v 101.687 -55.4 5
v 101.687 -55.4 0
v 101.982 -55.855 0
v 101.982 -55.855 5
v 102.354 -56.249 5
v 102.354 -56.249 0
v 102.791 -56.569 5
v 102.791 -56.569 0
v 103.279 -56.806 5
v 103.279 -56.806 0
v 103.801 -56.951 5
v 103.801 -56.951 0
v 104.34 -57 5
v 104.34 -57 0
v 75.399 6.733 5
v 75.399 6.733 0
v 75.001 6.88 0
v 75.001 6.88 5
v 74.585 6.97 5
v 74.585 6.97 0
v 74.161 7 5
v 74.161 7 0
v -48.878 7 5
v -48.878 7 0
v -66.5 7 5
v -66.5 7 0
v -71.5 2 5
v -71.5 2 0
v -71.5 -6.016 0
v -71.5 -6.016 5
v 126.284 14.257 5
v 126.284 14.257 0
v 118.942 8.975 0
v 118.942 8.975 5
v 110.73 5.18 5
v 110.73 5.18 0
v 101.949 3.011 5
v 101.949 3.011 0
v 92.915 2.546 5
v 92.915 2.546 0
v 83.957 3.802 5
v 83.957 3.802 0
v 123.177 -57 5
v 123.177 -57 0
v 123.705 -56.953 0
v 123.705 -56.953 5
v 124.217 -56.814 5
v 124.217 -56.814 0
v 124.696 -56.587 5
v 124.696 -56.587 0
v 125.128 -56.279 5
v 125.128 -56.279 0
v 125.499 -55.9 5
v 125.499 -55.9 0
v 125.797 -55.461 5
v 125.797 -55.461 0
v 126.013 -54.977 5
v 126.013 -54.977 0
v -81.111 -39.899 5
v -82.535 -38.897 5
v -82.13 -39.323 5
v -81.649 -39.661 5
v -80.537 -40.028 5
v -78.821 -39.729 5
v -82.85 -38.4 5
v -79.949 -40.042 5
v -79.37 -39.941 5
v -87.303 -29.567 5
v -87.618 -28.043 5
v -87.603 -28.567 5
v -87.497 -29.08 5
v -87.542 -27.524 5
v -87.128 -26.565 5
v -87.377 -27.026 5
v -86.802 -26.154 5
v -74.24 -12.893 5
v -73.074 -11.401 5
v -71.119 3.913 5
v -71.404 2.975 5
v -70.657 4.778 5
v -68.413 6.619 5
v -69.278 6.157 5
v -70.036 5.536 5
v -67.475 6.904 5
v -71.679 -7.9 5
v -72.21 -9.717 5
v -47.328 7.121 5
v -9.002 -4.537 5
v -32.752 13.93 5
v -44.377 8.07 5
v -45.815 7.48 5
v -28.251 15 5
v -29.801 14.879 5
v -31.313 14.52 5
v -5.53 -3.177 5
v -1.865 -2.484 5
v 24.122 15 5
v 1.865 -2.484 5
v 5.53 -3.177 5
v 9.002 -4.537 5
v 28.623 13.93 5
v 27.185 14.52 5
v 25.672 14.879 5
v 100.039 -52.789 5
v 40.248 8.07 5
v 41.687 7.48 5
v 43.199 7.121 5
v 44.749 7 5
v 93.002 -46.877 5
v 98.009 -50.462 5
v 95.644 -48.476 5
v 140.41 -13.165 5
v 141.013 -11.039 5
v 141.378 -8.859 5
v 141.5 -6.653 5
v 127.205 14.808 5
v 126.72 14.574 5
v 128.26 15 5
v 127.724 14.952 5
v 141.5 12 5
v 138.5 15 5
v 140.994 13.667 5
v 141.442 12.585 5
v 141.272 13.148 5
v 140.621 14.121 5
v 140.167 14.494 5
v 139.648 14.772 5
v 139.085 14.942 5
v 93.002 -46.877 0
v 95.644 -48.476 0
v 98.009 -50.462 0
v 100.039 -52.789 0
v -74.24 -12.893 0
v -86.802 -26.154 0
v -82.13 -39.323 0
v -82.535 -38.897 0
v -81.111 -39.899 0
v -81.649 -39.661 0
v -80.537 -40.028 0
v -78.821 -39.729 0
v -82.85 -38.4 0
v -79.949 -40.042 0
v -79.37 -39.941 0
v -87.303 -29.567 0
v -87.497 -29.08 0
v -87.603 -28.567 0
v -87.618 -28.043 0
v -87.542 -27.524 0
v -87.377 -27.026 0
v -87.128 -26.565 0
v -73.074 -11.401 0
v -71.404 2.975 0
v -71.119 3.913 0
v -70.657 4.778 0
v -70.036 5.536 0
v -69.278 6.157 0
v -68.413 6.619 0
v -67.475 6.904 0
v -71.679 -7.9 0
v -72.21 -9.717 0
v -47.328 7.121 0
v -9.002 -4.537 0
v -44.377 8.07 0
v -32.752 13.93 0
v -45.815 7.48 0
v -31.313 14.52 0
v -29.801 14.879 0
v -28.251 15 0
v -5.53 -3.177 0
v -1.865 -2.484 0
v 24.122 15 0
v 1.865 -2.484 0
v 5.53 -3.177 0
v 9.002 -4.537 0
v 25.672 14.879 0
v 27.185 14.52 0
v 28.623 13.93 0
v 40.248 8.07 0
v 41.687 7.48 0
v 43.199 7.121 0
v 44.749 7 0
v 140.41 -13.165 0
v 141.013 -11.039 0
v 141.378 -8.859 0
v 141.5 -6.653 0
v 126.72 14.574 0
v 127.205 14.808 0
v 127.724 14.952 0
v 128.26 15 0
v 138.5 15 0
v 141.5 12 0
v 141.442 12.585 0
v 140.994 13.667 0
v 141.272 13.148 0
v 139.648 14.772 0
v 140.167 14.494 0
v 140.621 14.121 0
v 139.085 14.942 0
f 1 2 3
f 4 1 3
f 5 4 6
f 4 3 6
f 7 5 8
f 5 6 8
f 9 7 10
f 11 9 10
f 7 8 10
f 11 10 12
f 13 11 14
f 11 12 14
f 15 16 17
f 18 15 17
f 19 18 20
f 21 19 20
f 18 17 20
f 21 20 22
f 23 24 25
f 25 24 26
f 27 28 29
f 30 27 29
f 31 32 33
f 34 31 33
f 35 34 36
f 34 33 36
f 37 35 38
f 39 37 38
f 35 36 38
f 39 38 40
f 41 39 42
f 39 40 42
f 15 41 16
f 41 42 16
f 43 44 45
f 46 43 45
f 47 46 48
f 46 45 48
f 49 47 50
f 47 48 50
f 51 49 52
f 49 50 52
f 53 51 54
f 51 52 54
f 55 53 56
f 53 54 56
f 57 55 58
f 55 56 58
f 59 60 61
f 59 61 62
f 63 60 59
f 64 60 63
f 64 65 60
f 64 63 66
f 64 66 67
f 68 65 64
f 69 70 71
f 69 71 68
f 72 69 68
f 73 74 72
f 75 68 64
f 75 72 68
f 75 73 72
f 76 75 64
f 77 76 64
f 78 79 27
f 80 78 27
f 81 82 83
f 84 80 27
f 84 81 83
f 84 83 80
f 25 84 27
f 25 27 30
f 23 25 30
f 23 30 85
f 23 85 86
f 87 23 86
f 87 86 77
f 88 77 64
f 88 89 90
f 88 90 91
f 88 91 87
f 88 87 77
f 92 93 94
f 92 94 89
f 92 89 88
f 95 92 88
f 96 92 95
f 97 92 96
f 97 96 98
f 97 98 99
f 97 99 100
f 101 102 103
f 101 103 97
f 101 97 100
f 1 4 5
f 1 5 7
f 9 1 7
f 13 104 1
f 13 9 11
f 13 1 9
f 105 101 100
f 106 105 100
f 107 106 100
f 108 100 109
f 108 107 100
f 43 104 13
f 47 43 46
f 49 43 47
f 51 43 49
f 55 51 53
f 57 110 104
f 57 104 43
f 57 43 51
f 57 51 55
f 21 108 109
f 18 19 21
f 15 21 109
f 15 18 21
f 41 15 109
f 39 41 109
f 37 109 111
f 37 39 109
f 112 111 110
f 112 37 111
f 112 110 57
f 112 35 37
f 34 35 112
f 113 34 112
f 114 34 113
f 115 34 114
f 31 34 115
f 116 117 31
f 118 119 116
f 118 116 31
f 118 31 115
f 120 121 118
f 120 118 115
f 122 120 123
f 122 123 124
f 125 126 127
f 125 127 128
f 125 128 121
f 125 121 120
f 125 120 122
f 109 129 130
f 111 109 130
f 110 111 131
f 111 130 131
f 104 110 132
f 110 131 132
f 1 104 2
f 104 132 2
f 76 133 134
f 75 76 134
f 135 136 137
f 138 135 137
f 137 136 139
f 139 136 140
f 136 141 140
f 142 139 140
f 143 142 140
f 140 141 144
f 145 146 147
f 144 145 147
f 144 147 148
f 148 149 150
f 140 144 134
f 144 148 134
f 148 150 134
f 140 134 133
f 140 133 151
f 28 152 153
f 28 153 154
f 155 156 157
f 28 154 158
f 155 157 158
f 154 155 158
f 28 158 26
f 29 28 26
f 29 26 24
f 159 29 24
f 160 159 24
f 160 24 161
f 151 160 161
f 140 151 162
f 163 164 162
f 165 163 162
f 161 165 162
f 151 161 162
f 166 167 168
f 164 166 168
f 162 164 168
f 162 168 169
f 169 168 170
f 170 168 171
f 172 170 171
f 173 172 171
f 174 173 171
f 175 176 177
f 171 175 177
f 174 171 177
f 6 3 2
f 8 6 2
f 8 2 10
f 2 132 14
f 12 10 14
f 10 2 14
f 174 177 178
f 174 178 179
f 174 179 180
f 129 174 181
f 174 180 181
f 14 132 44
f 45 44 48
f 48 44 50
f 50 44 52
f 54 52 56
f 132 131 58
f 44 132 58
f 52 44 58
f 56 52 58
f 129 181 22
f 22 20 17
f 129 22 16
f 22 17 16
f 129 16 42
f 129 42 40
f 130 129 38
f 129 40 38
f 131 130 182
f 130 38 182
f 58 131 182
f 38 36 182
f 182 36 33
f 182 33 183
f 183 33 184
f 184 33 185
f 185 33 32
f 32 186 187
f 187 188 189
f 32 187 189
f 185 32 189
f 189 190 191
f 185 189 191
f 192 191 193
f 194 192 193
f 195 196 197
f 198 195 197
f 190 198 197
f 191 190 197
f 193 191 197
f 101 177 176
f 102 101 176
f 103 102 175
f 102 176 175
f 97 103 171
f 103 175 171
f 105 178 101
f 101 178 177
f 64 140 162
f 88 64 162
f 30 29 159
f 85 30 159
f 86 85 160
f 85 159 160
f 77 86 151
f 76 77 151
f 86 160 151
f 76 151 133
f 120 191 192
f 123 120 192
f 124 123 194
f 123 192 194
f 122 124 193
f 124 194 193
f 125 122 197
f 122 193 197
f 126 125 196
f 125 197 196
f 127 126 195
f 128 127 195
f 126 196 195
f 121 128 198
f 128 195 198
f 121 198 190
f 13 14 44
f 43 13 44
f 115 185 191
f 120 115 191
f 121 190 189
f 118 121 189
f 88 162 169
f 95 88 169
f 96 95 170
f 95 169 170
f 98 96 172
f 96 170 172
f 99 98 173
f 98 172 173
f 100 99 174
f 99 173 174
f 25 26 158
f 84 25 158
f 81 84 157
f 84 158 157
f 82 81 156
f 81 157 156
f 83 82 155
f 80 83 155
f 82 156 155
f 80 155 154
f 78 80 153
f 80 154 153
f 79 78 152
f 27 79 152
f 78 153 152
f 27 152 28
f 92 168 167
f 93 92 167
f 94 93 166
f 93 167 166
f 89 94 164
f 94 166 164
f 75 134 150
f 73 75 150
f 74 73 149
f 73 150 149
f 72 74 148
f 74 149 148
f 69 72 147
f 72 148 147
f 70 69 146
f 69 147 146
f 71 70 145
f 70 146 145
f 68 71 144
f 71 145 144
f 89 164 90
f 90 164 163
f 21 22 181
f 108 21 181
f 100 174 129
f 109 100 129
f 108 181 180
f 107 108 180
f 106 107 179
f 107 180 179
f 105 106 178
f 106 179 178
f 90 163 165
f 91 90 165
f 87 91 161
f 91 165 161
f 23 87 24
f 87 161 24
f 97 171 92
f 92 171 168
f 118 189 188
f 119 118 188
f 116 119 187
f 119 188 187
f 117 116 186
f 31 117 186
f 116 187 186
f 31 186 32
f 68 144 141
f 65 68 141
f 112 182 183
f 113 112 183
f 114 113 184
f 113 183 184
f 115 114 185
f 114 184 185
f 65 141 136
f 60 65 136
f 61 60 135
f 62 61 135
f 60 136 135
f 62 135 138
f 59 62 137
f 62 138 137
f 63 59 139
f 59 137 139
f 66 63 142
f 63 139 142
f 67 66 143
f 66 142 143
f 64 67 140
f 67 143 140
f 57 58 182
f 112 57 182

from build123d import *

# Parameters (mm, degrees)
EXTRUDE1_DEPTH = 5


with BuildPart() as part:
    # Sketch1 → Extrude1 (new body)
    with BuildSketch(Plane.XY):
        with BuildLine():
            Line((9.001968821, -4.537365816), (93.001968821, -46.87685134))
            ThreePointArc((93.001968821, -46.87685134), (98.008613867, -50.462021725), (101.687244374, -55.40040394))
            ThreePointArc((101.687244374, -55.40040394), (102.79133326, -56.569164438), (104.34033103, -57))
            Line((104.34033103, -57), (123.176722972, -57))
            ThreePointArc((123.176722972, -57), (124.918831839, -56.442346555), (126.013278698, -54.976704463))
            Line((126.013278698, -54.976704463), (140.410371512, -13.164510908))
            ThreePointArc((140.410371512, -13.164510908), (141.225712031, -9.954099936), (141.5, -6.653147818))
            Line((141.5, -6.653147818), (141.5, 12))
            ThreePointArc((141.5, 12), (140.621320344, 14.121320344), (138.5, 15))
            Line((138.5, 15), (128.260336739, 15))
            ThreePointArc((128.260336739, 15), (127.204940422, 14.808226952), (126.284475151, 14.257425743))
            ThreePointArc((126.284475151, 14.257425743), (101.948595314, 3.0109904), (75.399274569, 6.732673267))
            ThreePointArc((75.399274569, 6.732673267), (74.794571806, 6.932406844), (74.161334016, 7))
            Line((74.161334016, 7), (44.749434711, 7))
            ThreePointArc((44.749434711, 7), (42.436200432, 7.271230953), (40.2484503, 8.070210566))
            Line((40.2484503, 8.070210566), (28.623258855, 13.929789434))
            ThreePointArc((28.623258855, 13.929789434), (26.435508723, 14.728769047), (24.122274444, 15))
            Line((24.122274444, 15), (-28.250565289, 15))
            ThreePointArc((-28.250565289, 15), (-30.563799568, 14.728769047), (-32.7515497, 13.929789434))
            Line((-32.7515497, 13.929789434), (-44.376741145, 8.070210566))
            ThreePointArc((-44.376741145, 8.070210566), (-46.564491277, 7.271230953), (-48.877725556, 7))
            Line((-48.877725556, 7), (-66.5, 7))
            ThreePointArc((-66.5, 7), (-70.035533906, 5.535533906), (-71.5, 2))
            Line((-71.5, 2), (-71.5, -6.015697791))
            ThreePointArc((-71.5, -6.015697791), (-72.210213011, -9.717029673), (-74.23997154, -12.892614743))
            Line((-74.23997154, -12.892614743), (-86.801586013, -26.154033952))
            ThreePointArc((-86.801586013, -26.154033952), (-87.591784672, -27.781510557), (-87.302514305, -29.56740436))
            Line((-87.302514305, -29.56740436), (-82.850295323, -38.400444957))
            ThreePointArc((-82.850295323, -38.400444957), (-81.110849912, -39.899247013), (-78.82106317, -39.729086464))
            Line((-78.82106317, -39.729086464), (-9.001968821, -4.537365816))
            ThreePointArc((-9.001968821, -4.537365816), (0, -2.396944684), (9.001968821, -4.537365816))
        make_face()
    extrude(amount=EXTRUDE1_DEPTH)


solid = part.part
